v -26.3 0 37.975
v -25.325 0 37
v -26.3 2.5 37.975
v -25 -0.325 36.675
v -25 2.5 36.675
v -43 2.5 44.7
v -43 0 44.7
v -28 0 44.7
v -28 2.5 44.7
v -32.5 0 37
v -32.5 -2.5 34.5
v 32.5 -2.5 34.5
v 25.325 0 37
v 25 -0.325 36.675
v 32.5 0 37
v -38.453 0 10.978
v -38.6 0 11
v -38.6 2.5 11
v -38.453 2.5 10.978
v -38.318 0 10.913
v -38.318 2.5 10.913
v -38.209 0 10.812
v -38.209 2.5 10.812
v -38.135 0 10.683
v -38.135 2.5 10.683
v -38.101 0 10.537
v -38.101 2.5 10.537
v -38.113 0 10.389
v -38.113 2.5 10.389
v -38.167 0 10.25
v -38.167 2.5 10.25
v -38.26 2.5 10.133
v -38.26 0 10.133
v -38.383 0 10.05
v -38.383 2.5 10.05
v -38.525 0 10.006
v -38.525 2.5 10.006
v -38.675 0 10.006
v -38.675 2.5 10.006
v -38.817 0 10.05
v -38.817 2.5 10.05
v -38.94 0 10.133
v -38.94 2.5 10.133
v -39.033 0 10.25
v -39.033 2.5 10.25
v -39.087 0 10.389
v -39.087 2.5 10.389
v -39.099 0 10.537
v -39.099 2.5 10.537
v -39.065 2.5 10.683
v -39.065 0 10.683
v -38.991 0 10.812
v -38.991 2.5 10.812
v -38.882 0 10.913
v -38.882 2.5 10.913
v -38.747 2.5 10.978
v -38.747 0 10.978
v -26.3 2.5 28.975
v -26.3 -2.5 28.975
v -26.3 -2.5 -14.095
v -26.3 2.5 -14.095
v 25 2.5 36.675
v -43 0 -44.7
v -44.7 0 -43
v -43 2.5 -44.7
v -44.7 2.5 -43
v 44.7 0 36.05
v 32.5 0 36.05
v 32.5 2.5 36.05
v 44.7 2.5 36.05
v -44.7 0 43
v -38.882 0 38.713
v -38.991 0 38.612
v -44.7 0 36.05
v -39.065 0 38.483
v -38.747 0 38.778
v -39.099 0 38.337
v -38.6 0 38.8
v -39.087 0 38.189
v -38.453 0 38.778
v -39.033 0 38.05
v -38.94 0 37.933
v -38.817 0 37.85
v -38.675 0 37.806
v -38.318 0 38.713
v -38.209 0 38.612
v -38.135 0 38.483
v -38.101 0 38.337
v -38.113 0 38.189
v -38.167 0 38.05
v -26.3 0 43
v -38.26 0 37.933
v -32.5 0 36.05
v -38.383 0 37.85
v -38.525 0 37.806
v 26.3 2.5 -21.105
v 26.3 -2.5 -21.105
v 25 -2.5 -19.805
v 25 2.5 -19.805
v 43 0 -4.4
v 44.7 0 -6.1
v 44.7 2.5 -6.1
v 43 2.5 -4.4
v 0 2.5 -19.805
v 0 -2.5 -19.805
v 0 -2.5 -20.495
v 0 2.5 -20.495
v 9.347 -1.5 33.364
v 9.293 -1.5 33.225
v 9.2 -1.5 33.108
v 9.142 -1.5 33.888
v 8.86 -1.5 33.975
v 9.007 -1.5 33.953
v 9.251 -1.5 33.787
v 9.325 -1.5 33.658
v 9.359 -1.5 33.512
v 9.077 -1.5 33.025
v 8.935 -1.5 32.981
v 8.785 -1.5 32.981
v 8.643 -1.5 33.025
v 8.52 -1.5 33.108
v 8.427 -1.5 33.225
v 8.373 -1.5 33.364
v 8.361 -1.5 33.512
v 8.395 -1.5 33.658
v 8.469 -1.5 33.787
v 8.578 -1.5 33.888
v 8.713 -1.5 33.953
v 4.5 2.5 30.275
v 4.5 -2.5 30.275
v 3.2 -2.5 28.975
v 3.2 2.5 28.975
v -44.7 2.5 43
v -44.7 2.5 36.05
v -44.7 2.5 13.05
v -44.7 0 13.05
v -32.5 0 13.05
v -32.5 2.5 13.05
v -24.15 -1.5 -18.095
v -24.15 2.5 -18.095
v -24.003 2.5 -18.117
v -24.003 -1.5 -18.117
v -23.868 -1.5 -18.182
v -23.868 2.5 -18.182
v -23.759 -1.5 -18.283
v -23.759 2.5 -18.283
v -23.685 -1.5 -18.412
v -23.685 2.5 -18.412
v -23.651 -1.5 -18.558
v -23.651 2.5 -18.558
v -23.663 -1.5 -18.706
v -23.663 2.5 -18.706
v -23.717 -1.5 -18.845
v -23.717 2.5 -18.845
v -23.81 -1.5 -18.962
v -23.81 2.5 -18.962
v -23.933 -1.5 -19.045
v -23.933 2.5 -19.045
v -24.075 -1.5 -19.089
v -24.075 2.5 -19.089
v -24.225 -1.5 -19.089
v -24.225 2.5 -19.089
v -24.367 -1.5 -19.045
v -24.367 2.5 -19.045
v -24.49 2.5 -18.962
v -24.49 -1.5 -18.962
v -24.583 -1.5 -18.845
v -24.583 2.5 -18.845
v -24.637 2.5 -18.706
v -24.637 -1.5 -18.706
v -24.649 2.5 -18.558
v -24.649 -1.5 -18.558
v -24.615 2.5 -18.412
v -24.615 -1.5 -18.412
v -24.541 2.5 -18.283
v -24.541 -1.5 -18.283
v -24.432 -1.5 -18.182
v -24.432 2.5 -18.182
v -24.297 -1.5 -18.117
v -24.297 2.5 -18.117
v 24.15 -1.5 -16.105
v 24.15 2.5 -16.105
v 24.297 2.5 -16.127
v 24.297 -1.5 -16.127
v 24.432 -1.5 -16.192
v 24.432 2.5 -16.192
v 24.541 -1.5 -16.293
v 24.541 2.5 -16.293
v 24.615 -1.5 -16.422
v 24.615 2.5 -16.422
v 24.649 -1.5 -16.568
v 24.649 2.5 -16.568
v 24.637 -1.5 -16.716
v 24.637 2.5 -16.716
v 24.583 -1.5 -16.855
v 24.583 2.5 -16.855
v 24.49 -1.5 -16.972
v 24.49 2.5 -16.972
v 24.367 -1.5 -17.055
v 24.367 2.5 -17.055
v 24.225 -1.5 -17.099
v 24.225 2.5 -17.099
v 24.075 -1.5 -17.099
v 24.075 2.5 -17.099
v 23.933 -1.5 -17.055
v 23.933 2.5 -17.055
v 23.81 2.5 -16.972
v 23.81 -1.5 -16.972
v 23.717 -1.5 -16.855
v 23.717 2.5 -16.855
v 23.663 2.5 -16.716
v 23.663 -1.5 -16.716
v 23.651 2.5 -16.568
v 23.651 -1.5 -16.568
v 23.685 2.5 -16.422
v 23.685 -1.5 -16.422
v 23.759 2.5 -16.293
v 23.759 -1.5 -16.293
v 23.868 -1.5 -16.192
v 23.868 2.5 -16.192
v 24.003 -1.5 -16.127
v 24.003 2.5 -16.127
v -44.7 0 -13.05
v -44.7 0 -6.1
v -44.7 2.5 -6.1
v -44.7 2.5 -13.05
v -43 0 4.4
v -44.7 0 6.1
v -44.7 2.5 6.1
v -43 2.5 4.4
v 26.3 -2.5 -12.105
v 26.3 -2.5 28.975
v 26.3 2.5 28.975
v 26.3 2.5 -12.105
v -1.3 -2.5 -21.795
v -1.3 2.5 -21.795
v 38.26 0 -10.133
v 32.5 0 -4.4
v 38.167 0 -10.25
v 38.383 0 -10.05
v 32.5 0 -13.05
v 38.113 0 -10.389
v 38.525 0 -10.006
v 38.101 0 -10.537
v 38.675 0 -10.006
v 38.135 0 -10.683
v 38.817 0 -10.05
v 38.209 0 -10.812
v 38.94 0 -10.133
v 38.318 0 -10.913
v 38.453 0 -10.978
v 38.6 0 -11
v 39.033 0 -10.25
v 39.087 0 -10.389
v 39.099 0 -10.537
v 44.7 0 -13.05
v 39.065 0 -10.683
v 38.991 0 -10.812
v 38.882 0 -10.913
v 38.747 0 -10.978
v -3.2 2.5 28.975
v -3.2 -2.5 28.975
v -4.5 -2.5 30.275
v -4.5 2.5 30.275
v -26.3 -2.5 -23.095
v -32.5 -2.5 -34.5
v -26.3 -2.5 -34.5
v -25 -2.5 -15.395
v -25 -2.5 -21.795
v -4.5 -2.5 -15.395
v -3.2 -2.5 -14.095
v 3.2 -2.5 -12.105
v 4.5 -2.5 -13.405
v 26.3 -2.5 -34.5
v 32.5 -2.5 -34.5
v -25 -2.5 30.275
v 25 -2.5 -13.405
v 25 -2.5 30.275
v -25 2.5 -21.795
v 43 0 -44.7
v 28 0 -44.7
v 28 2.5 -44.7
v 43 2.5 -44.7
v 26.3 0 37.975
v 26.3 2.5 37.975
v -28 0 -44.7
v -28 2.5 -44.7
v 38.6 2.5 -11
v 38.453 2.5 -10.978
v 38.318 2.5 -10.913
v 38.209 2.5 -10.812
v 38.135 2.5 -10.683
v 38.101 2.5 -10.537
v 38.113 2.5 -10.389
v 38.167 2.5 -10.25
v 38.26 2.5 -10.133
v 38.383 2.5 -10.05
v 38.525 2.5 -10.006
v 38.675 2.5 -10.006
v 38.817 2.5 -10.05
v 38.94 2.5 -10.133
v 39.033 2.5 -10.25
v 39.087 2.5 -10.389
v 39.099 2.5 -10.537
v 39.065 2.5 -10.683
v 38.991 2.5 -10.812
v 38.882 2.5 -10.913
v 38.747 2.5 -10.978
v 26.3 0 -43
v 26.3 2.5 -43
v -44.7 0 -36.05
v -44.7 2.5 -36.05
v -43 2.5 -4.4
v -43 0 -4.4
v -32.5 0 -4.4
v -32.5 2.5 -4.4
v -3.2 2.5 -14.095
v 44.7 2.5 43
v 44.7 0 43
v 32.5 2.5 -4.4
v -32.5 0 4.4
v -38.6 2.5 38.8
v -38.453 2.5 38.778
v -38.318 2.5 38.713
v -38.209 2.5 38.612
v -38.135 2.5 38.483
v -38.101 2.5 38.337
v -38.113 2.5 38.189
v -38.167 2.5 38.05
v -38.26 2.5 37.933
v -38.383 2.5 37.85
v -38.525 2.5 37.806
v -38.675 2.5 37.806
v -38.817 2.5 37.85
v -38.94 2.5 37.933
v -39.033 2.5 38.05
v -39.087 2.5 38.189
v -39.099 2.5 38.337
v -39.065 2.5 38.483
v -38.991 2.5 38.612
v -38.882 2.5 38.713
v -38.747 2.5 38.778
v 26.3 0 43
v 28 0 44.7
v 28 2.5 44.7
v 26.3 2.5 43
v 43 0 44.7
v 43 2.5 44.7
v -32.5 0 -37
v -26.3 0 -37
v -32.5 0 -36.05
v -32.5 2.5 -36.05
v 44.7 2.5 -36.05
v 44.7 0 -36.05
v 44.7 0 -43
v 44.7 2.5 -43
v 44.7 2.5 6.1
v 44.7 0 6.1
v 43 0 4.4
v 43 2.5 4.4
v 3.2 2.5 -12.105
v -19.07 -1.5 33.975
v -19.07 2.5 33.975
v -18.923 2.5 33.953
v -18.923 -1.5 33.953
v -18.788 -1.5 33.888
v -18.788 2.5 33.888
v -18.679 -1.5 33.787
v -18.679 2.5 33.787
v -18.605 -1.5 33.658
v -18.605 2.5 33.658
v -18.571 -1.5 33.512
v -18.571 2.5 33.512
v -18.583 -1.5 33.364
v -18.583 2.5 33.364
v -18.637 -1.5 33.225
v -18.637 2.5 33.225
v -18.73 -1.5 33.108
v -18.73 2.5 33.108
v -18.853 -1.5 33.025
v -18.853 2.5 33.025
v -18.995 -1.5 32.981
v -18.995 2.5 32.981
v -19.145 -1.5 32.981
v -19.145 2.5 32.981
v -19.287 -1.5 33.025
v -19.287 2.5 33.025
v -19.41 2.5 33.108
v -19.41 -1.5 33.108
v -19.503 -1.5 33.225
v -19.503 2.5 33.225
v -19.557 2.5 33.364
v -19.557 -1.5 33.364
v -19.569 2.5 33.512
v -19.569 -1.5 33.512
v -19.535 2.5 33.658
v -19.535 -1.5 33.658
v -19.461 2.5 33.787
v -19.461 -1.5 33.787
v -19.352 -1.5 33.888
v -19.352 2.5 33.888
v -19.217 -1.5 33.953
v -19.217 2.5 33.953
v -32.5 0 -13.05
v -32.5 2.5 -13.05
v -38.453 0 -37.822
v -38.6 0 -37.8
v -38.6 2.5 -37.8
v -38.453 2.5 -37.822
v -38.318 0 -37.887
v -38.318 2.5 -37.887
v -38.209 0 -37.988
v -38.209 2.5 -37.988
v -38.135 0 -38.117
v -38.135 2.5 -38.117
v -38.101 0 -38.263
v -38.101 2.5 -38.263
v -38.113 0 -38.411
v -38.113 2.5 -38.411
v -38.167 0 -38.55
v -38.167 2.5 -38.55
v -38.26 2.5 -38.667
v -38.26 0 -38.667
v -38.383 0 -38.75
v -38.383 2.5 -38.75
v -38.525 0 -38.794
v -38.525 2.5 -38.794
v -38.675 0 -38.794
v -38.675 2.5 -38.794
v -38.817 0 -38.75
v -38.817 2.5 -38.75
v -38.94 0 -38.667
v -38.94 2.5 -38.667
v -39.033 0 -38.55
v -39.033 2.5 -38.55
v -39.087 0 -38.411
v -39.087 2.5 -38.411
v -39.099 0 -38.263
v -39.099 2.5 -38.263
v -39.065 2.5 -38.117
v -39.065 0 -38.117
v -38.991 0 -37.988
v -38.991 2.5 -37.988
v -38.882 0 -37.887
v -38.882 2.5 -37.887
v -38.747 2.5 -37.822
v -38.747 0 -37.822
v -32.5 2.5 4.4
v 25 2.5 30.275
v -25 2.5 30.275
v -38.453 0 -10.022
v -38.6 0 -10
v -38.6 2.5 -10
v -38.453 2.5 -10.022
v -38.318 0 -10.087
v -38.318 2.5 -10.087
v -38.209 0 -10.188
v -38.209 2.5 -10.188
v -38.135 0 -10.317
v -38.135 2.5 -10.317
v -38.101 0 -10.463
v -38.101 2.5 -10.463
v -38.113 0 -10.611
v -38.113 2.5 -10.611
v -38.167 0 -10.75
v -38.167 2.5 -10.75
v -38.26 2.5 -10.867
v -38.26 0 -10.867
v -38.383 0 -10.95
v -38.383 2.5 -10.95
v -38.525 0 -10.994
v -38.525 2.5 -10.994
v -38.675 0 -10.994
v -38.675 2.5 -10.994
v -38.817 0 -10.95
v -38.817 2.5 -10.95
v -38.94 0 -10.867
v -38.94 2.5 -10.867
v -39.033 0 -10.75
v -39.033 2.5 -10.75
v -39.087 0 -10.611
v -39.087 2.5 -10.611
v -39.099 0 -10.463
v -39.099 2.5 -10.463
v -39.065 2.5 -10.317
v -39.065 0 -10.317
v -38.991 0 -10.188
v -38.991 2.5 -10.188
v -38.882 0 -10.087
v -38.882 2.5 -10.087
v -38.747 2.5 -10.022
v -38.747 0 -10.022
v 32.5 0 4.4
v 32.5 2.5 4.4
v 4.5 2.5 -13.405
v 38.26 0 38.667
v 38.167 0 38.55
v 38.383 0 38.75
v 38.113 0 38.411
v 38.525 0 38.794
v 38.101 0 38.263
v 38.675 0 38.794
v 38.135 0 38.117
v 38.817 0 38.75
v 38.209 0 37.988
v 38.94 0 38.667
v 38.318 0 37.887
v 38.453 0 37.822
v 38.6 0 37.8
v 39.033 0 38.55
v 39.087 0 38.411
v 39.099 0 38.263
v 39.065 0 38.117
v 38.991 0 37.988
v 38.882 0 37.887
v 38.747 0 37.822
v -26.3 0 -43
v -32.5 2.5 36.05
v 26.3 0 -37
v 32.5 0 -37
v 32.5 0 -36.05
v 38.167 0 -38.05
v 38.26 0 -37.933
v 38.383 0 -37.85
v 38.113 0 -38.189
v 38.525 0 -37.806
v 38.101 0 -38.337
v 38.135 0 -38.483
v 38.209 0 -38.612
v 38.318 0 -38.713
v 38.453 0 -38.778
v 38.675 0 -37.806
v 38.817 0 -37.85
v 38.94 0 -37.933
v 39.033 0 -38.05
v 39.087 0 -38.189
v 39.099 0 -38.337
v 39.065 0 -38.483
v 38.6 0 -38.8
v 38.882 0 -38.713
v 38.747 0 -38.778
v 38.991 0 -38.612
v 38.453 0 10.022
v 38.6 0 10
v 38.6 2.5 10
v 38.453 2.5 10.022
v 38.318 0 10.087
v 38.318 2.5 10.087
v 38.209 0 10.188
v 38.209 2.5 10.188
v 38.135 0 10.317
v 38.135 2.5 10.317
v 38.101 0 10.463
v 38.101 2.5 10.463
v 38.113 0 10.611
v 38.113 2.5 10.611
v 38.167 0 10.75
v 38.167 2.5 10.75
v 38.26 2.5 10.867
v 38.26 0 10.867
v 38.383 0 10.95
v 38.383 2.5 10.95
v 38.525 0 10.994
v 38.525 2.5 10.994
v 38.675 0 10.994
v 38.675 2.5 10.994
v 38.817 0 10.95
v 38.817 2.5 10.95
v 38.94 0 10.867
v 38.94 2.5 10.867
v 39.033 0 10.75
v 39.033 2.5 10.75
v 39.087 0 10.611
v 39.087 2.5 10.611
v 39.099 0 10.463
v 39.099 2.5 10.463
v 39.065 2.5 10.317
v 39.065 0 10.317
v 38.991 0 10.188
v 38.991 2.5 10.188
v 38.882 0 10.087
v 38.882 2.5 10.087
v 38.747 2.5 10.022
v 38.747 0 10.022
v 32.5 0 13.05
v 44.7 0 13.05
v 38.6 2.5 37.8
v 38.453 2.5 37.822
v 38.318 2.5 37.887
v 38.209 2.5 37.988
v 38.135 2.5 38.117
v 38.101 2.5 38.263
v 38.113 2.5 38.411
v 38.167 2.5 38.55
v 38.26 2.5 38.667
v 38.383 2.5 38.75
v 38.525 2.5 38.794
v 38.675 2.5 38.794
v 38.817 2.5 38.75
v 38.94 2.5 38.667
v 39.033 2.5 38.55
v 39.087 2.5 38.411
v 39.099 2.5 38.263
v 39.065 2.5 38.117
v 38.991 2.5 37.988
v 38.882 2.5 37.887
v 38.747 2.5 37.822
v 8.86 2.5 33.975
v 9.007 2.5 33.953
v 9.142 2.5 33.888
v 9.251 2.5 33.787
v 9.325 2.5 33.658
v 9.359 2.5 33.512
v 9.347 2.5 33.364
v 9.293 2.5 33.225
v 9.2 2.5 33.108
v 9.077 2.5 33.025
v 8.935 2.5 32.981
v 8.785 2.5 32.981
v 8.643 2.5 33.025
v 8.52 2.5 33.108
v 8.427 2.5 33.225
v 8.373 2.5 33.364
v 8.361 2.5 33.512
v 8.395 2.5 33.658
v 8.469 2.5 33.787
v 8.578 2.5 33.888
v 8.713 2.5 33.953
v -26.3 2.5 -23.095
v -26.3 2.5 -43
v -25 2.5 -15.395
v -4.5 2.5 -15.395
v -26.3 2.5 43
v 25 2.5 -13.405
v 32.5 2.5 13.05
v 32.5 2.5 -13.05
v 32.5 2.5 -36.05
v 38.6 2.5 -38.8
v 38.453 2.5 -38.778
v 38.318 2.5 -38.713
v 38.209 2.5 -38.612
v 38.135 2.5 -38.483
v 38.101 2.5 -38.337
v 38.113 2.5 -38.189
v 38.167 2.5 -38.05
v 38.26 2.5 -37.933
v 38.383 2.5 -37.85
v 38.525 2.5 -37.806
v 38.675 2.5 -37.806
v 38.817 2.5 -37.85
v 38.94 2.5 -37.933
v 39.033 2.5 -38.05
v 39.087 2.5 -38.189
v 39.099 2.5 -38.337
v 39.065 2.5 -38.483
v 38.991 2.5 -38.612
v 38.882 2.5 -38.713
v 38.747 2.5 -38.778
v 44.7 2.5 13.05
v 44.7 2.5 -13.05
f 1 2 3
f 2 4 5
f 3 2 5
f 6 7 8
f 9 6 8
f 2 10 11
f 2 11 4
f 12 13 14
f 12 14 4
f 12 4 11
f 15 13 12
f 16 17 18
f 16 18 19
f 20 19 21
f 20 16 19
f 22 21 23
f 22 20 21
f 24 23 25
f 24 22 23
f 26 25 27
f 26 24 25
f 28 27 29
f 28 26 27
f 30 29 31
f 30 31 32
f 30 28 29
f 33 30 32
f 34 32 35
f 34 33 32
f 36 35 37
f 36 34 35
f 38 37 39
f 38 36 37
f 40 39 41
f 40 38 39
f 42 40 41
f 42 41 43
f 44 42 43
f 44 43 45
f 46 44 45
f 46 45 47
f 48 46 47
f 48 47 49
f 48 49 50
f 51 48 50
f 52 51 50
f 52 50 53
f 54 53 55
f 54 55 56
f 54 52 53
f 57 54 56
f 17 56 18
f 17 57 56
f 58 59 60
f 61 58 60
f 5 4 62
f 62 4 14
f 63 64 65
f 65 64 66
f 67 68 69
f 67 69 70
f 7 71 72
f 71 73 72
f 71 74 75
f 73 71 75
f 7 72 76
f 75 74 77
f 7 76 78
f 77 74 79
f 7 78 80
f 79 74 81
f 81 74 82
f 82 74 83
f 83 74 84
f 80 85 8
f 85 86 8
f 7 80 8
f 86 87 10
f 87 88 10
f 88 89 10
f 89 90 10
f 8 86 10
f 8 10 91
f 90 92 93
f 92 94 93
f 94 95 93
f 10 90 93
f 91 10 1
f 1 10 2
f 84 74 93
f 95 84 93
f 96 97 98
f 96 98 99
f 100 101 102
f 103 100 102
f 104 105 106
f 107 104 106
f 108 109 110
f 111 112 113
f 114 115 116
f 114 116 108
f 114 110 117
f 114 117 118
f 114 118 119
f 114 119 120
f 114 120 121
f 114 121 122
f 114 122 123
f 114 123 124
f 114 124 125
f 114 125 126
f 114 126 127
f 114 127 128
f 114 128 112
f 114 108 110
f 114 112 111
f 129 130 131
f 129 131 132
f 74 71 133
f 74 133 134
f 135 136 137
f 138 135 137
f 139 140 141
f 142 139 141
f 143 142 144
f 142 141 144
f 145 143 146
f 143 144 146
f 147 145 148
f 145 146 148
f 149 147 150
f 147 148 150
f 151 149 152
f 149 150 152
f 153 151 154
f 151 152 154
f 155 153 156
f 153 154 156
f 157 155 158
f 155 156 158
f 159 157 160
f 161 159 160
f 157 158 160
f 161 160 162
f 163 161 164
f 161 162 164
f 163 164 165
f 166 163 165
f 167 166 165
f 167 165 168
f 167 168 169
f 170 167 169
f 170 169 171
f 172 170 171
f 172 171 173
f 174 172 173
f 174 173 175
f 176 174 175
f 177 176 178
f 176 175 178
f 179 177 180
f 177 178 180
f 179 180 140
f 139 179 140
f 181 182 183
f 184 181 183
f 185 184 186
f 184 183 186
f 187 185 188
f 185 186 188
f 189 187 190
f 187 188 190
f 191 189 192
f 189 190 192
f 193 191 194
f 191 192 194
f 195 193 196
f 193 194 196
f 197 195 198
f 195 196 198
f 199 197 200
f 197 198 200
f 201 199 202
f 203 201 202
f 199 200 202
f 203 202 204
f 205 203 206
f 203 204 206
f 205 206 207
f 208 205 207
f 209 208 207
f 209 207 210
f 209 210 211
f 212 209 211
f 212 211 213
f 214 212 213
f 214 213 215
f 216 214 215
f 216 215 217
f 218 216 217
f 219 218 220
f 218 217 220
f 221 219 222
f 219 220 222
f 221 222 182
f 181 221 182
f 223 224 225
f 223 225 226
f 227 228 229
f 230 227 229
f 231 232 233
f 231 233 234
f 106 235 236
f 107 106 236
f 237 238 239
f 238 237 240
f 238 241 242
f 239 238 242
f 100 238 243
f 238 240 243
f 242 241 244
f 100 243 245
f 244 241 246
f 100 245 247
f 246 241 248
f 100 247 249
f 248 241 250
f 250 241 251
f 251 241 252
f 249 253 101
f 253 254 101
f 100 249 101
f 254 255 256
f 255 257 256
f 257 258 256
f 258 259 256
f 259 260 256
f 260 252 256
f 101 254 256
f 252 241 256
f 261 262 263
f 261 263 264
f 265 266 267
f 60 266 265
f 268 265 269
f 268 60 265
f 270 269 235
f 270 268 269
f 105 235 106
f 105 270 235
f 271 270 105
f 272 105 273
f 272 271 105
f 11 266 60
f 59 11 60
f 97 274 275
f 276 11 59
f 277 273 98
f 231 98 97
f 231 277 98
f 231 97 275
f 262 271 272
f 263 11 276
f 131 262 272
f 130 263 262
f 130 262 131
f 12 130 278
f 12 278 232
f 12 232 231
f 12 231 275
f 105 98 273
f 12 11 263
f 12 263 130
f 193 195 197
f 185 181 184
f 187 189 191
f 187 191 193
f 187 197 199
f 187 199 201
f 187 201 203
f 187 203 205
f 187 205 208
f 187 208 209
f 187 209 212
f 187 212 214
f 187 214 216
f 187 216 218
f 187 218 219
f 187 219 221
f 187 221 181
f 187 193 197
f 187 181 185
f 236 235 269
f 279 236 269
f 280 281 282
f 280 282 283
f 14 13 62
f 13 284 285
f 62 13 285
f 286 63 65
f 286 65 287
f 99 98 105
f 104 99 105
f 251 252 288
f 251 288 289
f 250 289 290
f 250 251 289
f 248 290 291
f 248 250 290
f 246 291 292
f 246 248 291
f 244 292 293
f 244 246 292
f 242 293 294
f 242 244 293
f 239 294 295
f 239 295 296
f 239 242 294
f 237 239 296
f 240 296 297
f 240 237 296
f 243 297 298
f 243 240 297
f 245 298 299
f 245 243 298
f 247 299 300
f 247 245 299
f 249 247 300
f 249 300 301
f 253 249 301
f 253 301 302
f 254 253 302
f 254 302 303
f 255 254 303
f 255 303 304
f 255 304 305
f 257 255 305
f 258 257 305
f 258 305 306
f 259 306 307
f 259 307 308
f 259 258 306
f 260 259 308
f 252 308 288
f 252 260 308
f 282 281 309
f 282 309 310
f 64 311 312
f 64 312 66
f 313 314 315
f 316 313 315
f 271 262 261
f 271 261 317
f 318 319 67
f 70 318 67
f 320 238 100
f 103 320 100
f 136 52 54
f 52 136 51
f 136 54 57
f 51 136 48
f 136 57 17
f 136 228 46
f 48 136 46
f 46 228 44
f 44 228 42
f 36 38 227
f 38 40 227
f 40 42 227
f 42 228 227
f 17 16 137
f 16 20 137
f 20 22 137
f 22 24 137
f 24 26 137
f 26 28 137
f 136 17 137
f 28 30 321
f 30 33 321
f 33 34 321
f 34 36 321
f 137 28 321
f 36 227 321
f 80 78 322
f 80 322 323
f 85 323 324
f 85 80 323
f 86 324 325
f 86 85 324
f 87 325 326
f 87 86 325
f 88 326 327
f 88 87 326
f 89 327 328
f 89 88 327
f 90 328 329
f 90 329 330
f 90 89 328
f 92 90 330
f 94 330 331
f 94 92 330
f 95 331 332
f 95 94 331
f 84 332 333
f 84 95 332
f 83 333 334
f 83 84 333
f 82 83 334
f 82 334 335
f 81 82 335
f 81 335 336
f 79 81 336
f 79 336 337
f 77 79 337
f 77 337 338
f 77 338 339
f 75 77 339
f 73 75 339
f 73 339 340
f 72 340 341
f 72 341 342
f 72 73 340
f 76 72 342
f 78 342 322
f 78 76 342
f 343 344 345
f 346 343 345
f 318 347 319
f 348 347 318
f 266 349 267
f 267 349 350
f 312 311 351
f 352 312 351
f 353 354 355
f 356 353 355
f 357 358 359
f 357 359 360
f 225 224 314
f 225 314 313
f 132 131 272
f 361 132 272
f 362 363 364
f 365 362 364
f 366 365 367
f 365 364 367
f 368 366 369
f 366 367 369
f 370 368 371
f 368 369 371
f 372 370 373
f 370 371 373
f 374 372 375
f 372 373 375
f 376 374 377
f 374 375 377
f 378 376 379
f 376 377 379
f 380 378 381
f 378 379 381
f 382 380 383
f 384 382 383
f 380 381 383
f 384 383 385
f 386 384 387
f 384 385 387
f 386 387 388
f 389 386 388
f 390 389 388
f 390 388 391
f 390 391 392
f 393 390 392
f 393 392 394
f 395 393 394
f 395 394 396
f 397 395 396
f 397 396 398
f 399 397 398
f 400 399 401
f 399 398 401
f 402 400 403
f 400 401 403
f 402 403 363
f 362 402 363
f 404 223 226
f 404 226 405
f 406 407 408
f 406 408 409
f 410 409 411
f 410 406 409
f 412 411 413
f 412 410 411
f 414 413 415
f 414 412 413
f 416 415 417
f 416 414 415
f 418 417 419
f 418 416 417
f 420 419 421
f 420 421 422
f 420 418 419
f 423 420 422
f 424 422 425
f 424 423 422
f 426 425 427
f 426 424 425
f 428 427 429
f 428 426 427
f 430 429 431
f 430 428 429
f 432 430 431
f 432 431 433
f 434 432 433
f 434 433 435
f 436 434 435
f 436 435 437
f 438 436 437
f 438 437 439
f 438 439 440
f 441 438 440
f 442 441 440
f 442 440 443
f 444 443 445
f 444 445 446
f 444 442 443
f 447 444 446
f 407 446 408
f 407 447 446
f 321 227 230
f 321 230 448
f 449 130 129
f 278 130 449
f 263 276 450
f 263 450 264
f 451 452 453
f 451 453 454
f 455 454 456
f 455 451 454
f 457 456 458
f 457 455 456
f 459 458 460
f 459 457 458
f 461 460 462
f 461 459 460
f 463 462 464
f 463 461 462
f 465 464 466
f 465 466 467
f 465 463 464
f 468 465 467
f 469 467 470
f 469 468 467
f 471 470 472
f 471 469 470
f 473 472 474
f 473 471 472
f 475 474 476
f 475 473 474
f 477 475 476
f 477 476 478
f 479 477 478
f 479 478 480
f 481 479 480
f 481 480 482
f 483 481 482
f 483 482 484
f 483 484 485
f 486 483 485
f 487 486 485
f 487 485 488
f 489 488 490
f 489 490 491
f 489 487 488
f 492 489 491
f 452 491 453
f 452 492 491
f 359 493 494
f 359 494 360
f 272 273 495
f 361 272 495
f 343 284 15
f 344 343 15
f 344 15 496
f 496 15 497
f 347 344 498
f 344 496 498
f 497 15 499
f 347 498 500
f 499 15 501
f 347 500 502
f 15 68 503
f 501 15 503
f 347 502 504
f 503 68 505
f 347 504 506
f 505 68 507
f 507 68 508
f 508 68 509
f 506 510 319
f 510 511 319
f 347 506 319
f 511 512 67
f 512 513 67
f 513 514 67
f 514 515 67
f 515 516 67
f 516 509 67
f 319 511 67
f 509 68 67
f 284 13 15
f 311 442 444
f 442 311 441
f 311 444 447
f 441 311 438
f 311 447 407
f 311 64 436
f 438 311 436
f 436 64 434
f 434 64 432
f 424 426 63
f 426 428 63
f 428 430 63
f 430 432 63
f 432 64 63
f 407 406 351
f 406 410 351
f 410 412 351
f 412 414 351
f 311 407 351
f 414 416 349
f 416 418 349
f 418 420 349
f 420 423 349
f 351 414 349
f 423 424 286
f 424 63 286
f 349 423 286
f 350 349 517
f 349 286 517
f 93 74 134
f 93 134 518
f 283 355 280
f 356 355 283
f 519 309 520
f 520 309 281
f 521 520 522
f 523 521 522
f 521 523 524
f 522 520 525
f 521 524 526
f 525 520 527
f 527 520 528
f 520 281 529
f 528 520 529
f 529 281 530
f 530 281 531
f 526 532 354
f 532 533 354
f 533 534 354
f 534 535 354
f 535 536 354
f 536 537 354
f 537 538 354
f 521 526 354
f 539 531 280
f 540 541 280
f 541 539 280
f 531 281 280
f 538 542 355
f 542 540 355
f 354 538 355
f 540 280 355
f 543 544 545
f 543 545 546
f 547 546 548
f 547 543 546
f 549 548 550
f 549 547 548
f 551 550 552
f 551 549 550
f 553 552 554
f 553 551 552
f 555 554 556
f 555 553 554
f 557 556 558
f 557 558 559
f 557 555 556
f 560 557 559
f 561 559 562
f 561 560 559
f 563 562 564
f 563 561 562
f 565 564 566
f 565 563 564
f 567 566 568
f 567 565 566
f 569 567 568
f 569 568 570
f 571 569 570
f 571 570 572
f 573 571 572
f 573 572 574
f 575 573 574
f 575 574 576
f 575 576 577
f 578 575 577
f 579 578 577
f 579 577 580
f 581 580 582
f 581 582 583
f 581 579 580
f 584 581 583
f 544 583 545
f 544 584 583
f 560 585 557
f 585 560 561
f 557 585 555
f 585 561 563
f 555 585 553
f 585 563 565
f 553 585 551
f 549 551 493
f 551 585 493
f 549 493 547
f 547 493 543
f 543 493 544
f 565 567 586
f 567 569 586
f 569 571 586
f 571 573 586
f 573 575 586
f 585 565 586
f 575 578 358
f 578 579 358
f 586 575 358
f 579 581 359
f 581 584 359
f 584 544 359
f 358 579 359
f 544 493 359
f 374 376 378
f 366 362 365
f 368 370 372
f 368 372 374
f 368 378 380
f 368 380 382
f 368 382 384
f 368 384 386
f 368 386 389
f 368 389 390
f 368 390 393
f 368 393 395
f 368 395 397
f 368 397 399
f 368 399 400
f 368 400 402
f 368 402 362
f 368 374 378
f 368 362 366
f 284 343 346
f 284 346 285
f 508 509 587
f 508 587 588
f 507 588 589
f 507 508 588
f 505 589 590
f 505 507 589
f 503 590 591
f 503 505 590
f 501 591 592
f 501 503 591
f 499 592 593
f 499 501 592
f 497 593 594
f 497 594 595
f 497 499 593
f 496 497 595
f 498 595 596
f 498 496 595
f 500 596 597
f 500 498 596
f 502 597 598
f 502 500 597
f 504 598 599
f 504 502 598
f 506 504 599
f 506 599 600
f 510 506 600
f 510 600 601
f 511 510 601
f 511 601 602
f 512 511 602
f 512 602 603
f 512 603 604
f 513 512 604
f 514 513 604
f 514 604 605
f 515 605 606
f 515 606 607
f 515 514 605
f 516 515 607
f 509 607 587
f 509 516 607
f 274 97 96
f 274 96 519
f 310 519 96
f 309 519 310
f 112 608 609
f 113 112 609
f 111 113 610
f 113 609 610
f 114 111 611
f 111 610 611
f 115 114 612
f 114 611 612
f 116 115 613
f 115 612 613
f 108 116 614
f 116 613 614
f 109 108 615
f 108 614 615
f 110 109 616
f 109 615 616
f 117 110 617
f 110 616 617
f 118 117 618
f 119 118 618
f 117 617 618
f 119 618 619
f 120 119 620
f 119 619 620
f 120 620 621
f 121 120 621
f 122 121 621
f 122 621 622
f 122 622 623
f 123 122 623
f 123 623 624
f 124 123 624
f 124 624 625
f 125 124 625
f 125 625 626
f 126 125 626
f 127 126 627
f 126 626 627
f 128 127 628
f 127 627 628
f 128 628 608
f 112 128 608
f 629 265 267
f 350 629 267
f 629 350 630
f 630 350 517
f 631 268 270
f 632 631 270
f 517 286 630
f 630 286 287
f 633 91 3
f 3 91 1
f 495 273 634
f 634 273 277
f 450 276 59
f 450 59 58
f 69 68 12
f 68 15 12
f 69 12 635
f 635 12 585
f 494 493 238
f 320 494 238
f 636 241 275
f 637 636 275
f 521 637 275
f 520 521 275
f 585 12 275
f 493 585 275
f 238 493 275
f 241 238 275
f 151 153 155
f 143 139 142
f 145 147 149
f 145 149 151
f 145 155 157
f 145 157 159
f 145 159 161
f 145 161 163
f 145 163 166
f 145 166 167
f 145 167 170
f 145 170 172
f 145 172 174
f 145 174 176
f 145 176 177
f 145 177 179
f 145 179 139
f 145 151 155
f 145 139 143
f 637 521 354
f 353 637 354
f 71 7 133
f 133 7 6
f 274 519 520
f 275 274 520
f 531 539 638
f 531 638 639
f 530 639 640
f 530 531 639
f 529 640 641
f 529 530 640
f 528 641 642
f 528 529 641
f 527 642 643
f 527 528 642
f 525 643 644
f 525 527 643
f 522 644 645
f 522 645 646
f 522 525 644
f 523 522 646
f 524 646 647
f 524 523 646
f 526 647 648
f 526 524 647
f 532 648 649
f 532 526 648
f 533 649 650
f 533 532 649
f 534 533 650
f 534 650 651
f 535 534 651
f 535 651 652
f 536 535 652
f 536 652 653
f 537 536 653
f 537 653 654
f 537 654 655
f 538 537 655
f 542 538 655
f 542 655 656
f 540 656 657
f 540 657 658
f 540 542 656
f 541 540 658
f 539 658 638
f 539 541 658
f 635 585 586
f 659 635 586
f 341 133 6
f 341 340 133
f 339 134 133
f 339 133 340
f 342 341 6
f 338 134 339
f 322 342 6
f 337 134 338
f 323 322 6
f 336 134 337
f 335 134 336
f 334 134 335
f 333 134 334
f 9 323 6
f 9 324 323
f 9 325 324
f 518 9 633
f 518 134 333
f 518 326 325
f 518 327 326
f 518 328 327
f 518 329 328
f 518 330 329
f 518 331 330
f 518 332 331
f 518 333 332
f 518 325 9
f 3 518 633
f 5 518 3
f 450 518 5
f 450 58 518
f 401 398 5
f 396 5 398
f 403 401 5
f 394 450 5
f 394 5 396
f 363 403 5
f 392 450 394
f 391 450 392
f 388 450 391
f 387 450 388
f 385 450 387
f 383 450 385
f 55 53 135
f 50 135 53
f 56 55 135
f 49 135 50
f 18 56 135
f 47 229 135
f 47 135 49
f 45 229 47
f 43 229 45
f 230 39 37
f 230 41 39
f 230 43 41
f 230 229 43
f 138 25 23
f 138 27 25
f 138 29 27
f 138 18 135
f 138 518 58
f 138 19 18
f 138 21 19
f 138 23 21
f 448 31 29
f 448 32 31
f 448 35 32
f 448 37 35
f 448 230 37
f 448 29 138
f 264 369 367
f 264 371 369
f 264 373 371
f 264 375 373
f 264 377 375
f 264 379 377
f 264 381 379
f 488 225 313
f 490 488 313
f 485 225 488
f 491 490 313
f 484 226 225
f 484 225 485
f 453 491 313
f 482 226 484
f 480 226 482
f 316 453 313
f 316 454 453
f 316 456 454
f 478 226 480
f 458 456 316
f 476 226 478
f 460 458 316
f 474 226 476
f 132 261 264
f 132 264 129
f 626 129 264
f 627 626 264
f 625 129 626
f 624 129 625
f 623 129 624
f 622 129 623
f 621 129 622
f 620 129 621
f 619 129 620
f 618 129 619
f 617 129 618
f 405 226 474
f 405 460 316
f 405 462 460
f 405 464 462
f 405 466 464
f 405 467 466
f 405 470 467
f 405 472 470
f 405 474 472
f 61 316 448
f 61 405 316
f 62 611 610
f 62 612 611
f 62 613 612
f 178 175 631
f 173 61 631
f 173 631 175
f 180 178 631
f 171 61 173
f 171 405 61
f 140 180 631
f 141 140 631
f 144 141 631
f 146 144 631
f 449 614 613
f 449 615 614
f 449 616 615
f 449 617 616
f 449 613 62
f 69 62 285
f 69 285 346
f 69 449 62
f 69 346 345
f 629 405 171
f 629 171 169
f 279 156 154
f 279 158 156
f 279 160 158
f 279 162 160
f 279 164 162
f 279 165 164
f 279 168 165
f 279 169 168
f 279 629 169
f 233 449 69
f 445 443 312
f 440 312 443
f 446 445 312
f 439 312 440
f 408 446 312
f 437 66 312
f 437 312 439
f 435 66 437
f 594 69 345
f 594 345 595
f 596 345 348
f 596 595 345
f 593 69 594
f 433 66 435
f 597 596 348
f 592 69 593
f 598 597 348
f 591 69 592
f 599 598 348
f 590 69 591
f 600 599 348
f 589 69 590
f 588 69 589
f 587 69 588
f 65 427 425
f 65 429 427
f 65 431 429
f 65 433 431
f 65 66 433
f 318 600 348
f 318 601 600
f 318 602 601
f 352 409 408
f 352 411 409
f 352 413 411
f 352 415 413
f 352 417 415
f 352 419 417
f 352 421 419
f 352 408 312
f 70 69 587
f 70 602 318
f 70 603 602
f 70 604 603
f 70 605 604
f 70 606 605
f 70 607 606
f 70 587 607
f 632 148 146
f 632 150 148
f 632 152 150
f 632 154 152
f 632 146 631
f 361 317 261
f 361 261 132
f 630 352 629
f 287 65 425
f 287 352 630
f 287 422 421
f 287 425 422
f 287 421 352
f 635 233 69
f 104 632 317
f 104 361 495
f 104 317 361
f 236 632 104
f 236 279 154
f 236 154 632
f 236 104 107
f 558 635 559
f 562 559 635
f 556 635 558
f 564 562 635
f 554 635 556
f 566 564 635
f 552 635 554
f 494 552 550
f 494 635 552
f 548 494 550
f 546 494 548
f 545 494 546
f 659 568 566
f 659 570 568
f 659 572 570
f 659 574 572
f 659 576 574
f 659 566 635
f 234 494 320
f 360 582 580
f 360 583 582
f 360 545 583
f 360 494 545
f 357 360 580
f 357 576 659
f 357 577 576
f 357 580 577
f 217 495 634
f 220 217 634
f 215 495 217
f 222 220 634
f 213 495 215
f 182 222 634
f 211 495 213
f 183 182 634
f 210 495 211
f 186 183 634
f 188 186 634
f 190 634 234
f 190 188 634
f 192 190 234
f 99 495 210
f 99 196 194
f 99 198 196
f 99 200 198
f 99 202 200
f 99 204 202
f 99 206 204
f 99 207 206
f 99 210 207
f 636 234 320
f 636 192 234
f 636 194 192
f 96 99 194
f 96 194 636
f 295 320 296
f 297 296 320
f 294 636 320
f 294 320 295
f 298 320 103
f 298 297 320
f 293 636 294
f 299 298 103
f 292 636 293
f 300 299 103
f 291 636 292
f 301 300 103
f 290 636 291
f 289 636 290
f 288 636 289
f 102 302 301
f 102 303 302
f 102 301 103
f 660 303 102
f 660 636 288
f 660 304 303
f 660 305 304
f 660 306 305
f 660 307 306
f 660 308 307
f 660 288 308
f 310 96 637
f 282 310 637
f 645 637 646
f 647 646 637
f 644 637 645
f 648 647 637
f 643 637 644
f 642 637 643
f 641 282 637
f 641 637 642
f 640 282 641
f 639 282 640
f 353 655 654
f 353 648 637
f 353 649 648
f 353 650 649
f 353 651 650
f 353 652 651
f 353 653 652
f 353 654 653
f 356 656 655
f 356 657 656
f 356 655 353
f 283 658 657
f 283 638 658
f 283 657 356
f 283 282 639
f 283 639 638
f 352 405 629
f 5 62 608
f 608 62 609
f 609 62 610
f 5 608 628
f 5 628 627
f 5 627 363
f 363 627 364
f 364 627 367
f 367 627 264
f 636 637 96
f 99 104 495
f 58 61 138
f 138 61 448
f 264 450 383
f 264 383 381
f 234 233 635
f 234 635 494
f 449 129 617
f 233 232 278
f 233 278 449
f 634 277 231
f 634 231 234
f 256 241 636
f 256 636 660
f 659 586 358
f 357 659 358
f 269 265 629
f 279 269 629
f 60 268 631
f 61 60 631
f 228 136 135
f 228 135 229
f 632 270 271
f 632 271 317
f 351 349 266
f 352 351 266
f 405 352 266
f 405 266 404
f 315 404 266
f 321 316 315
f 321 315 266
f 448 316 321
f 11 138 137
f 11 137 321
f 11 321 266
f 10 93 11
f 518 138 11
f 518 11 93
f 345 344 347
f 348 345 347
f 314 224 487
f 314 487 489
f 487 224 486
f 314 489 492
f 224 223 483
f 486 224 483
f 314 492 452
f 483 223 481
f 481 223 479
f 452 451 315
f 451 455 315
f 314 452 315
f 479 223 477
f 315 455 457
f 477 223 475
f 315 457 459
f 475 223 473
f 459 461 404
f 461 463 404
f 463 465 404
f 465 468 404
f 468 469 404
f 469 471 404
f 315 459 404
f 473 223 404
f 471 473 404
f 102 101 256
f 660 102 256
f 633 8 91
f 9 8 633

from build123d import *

# Parameters (mm, degrees)
SKETCH1_W               = 89.4
SKETCH1_H               = 89.4
SKETCH1_R               = 0.5
BOSS_EXTRUDE1_DEPTH     = 2.5
SKETCH5_W               = 65
SKETCH5_H               = 74
BOSS_EXTRUDE3_DEPTH     = 2.5
SKETCH7_R               = 0.5
CUT_EXTRUDE2_DEPTH      = 4
CUT_EXTRUDE1_DEPTH      = 64.412774738
CUT_EXTRUDE1_DEPTH_BACK = 64.412774738
SKETCH2_W               = 12.2
SKETCH2_H               = 23
SKETCH2_W_2             = 52.6
SKETCH2_H_2             = 8.025
SKETCH2_W_3             = 23.1
SKETCH2_H_3             = 45.67
SKETCH2_H_4             = 43.68
SKETCH2_H_5             = 8.8
CHAMFER2_SIZE           = 1.3
CHAMFER3_SIZE           = 1.3
CHAMFER4_SIZE           = 1.7
CHAMFER5_SIZE           = 2.5


with BuildPart() as part:
    # Sketch1 → Boss-Extrude1 (new body)
    with BuildSketch(Plane(origin=(0, 0, 0), x_dir=(1, 0, 0), z_dir=(0, 1, 0))):
        Rectangle(SKETCH1_W, SKETCH1_H)
        with Locations(Location((-38.6, 38.3, 0), (0, 0, 270))):
            Circle(SKETCH1_R, mode=Mode.SUBTRACT)
        with Locations(Location((-38.6, 10.5, 0), (0, 0, 270))):
            Circle(SKETCH1_R, mode=Mode.SUBTRACT)
        with Locations(Location((-38.6, -10.5, 0), (0, 0, 270))):
            Circle(SKETCH1_R, mode=Mode.SUBTRACT)
        with Locations(Location((-38.6, -38.3, 0), (0, 0, 270))):
            Circle(SKETCH1_R, mode=Mode.SUBTRACT)
        with Locations(Location((38.6, -38.3, 0), (0, 0, 90))):
            Circle(SKETCH1_R, mode=Mode.SUBTRACT)
        with Locations(Location((38.6, -10.5, 0), (0, 0, 90))):
            Circle(SKETCH1_R, mode=Mode.SUBTRACT)
        with Locations(Location((38.6, 10.5, 0), (0, 0, 90))):
            Circle(SKETCH1_R, mode=Mode.SUBTRACT)
        with Locations(Location((38.6, 38.3, 0), (0, 0, 90))):
            Circle(SKETCH1_R, mode=Mode.SUBTRACT)
    extrude(amount=BOSS_EXTRUDE1_DEPTH)

    # Sketch5 → Boss-Extrude3 (add)
    with BuildSketch(Plane.XZ):
        Rectangle(SKETCH5_W, SKETCH5_H)
    extrude(amount=BOSS_EXTRUDE3_DEPTH)

    # Sketch7 → Cut-Extrude2 (cut)
    with BuildSketch(Plane(origin=(0, 2.5, 0), x_dir=(1, 0, 0), z_dir=(0, 1, 0))):
        with Locations(Location((-24.15, 18.595, 0), (0, 0, 270))):
            Circle(SKETCH7_R)
        with Locations(Location((24.15, 16.605, 0), (0, 0, 270))):
            Circle(SKETCH7_R)
        with Locations(Location((-19.07, -33.475, 0), (0, 0, 270))):
            Circle(SKETCH7_R)
        with Locations(Location((8.86, -33.475, 0), (0, 0, 270))):
            Circle(SKETCH7_R)
    extrude(amount=-CUT_EXTRUDE2_DEPTH, mode=Mode.SUBTRACT)

    # Sketch2 → Cut-Extrude1 (cut, two sides: drawn at the far end of the back side and taken through both)
    with BuildSketch(Plane(origin=(0, 2.5, 0), x_dir=(1, 0, 0), z_dir=(0, 1, 0)).offset(-CUT_EXTRUDE1_DEPTH_BACK)):
        with Locations((-38.6, 24.55)):
            Rectangle(SKETCH2_W, SKETCH2_H)
        Polygon((-26.3, 44.7), (26.3, 44.7), (26.3, 24.23), (26.3, 19.805), (0, 19.805), (0, 21.795), (-26.3, 21.795), align=None)
        with Locations((0, -40.6875)):
            Rectangle(SKETCH2_W_2, SKETCH2_H_2)
        with Locations((-14.75, -7.44)):
            Rectangle(SKETCH2_W_3, SKETCH2_H_3)
        with Locations((14.75, -8.435)):
            Rectangle(SKETCH2_W_3, SKETCH2_H_4)
        with Locations((-38.6, 0)):
            Rectangle(SKETCH2_W, SKETCH2_H_5)
        with Locations((38.6, 0)):
            Rectangle(SKETCH2_W, SKETCH2_H_5)
        with Locations((38.6, 24.55)):
            Rectangle(SKETCH2_W, SKETCH2_H)
        with Locations((38.6, -24.55)):
            Rectangle(SKETCH2_W, SKETCH2_H)
        with Locations((-38.6, -24.55)):
            Rectangle(SKETCH2_W, SKETCH2_H)
    extrude(amount=CUT_EXTRUDE1_DEPTH + CUT_EXTRUDE1_DEPTH_BACK, mode=Mode.SUBTRACT)

    # Chamfer2
    chamfer2_edges = [part.edges().sort_by_distance(p)[0] for p in [
        (0, 0, -21.795),
    ]]
    chamfer(chamfer2_edges, length=CHAMFER2_SIZE)

    # Chamfer3
    chamfer3_edges = [part.edges().sort_by_distance(p)[0] for p in [
        (-26.3, 0, -21.795),
        (26.3, 0, 36.675),
        (-26.3, 0, 36.675),
        (-26.3, 0, 30.275),
        (-3.2, 0, 30.275),
        (3.2, 0, 30.275),
        (26.3, 0, 30.275),
        (-3.2, 0, -15.395),
        (3.2, 0, -13.405),
        (26.3, 0, -13.405),
        (26.3, 0, -19.805),
        (-26.3, 0, -15.395),
    ]]
    chamfer(chamfer3_edges, length=CHAMFER3_SIZE)

    # Chamfer4
    chamfer4_edges = [part.edges().sort_by_distance(p)[0] for p in [
        (26.3, 1.25, 44.7),
        (-26.3, 1.25, 44.7),
        (-44.7, 1.25, 4.4),
        (-44.7, 1.25, -4.4),
        (-26.3, 1.25, -44.7),
        (26.3, 1.25, -44.7),
        (44.7, 1.25, -4.4),
        (44.7, 1.25, 4.4),
        (-44.7, 1.25, -44.7),
        (44.7, 1.25, -44.7),
        (44.7, 1.25, 44.7),
        (-44.7, 1.25, 44.7),
    ]]
    chamfer(chamfer4_edges, length=CHAMFER4_SIZE)

    # Chamfer5
    chamfer5_edges = [part.edges().sort_by_distance(p)[0] for p in [
        (28.9125, -2.5, 37),
        (29.4, -2.5, -37),
        (-29.4, -2.5, -37),
    ]]
    chamfer(chamfer5_edges, length=CHAMFER5_SIZE - 0.0001)  # a hair under: the kernel refuses the full size


solid = part.part
